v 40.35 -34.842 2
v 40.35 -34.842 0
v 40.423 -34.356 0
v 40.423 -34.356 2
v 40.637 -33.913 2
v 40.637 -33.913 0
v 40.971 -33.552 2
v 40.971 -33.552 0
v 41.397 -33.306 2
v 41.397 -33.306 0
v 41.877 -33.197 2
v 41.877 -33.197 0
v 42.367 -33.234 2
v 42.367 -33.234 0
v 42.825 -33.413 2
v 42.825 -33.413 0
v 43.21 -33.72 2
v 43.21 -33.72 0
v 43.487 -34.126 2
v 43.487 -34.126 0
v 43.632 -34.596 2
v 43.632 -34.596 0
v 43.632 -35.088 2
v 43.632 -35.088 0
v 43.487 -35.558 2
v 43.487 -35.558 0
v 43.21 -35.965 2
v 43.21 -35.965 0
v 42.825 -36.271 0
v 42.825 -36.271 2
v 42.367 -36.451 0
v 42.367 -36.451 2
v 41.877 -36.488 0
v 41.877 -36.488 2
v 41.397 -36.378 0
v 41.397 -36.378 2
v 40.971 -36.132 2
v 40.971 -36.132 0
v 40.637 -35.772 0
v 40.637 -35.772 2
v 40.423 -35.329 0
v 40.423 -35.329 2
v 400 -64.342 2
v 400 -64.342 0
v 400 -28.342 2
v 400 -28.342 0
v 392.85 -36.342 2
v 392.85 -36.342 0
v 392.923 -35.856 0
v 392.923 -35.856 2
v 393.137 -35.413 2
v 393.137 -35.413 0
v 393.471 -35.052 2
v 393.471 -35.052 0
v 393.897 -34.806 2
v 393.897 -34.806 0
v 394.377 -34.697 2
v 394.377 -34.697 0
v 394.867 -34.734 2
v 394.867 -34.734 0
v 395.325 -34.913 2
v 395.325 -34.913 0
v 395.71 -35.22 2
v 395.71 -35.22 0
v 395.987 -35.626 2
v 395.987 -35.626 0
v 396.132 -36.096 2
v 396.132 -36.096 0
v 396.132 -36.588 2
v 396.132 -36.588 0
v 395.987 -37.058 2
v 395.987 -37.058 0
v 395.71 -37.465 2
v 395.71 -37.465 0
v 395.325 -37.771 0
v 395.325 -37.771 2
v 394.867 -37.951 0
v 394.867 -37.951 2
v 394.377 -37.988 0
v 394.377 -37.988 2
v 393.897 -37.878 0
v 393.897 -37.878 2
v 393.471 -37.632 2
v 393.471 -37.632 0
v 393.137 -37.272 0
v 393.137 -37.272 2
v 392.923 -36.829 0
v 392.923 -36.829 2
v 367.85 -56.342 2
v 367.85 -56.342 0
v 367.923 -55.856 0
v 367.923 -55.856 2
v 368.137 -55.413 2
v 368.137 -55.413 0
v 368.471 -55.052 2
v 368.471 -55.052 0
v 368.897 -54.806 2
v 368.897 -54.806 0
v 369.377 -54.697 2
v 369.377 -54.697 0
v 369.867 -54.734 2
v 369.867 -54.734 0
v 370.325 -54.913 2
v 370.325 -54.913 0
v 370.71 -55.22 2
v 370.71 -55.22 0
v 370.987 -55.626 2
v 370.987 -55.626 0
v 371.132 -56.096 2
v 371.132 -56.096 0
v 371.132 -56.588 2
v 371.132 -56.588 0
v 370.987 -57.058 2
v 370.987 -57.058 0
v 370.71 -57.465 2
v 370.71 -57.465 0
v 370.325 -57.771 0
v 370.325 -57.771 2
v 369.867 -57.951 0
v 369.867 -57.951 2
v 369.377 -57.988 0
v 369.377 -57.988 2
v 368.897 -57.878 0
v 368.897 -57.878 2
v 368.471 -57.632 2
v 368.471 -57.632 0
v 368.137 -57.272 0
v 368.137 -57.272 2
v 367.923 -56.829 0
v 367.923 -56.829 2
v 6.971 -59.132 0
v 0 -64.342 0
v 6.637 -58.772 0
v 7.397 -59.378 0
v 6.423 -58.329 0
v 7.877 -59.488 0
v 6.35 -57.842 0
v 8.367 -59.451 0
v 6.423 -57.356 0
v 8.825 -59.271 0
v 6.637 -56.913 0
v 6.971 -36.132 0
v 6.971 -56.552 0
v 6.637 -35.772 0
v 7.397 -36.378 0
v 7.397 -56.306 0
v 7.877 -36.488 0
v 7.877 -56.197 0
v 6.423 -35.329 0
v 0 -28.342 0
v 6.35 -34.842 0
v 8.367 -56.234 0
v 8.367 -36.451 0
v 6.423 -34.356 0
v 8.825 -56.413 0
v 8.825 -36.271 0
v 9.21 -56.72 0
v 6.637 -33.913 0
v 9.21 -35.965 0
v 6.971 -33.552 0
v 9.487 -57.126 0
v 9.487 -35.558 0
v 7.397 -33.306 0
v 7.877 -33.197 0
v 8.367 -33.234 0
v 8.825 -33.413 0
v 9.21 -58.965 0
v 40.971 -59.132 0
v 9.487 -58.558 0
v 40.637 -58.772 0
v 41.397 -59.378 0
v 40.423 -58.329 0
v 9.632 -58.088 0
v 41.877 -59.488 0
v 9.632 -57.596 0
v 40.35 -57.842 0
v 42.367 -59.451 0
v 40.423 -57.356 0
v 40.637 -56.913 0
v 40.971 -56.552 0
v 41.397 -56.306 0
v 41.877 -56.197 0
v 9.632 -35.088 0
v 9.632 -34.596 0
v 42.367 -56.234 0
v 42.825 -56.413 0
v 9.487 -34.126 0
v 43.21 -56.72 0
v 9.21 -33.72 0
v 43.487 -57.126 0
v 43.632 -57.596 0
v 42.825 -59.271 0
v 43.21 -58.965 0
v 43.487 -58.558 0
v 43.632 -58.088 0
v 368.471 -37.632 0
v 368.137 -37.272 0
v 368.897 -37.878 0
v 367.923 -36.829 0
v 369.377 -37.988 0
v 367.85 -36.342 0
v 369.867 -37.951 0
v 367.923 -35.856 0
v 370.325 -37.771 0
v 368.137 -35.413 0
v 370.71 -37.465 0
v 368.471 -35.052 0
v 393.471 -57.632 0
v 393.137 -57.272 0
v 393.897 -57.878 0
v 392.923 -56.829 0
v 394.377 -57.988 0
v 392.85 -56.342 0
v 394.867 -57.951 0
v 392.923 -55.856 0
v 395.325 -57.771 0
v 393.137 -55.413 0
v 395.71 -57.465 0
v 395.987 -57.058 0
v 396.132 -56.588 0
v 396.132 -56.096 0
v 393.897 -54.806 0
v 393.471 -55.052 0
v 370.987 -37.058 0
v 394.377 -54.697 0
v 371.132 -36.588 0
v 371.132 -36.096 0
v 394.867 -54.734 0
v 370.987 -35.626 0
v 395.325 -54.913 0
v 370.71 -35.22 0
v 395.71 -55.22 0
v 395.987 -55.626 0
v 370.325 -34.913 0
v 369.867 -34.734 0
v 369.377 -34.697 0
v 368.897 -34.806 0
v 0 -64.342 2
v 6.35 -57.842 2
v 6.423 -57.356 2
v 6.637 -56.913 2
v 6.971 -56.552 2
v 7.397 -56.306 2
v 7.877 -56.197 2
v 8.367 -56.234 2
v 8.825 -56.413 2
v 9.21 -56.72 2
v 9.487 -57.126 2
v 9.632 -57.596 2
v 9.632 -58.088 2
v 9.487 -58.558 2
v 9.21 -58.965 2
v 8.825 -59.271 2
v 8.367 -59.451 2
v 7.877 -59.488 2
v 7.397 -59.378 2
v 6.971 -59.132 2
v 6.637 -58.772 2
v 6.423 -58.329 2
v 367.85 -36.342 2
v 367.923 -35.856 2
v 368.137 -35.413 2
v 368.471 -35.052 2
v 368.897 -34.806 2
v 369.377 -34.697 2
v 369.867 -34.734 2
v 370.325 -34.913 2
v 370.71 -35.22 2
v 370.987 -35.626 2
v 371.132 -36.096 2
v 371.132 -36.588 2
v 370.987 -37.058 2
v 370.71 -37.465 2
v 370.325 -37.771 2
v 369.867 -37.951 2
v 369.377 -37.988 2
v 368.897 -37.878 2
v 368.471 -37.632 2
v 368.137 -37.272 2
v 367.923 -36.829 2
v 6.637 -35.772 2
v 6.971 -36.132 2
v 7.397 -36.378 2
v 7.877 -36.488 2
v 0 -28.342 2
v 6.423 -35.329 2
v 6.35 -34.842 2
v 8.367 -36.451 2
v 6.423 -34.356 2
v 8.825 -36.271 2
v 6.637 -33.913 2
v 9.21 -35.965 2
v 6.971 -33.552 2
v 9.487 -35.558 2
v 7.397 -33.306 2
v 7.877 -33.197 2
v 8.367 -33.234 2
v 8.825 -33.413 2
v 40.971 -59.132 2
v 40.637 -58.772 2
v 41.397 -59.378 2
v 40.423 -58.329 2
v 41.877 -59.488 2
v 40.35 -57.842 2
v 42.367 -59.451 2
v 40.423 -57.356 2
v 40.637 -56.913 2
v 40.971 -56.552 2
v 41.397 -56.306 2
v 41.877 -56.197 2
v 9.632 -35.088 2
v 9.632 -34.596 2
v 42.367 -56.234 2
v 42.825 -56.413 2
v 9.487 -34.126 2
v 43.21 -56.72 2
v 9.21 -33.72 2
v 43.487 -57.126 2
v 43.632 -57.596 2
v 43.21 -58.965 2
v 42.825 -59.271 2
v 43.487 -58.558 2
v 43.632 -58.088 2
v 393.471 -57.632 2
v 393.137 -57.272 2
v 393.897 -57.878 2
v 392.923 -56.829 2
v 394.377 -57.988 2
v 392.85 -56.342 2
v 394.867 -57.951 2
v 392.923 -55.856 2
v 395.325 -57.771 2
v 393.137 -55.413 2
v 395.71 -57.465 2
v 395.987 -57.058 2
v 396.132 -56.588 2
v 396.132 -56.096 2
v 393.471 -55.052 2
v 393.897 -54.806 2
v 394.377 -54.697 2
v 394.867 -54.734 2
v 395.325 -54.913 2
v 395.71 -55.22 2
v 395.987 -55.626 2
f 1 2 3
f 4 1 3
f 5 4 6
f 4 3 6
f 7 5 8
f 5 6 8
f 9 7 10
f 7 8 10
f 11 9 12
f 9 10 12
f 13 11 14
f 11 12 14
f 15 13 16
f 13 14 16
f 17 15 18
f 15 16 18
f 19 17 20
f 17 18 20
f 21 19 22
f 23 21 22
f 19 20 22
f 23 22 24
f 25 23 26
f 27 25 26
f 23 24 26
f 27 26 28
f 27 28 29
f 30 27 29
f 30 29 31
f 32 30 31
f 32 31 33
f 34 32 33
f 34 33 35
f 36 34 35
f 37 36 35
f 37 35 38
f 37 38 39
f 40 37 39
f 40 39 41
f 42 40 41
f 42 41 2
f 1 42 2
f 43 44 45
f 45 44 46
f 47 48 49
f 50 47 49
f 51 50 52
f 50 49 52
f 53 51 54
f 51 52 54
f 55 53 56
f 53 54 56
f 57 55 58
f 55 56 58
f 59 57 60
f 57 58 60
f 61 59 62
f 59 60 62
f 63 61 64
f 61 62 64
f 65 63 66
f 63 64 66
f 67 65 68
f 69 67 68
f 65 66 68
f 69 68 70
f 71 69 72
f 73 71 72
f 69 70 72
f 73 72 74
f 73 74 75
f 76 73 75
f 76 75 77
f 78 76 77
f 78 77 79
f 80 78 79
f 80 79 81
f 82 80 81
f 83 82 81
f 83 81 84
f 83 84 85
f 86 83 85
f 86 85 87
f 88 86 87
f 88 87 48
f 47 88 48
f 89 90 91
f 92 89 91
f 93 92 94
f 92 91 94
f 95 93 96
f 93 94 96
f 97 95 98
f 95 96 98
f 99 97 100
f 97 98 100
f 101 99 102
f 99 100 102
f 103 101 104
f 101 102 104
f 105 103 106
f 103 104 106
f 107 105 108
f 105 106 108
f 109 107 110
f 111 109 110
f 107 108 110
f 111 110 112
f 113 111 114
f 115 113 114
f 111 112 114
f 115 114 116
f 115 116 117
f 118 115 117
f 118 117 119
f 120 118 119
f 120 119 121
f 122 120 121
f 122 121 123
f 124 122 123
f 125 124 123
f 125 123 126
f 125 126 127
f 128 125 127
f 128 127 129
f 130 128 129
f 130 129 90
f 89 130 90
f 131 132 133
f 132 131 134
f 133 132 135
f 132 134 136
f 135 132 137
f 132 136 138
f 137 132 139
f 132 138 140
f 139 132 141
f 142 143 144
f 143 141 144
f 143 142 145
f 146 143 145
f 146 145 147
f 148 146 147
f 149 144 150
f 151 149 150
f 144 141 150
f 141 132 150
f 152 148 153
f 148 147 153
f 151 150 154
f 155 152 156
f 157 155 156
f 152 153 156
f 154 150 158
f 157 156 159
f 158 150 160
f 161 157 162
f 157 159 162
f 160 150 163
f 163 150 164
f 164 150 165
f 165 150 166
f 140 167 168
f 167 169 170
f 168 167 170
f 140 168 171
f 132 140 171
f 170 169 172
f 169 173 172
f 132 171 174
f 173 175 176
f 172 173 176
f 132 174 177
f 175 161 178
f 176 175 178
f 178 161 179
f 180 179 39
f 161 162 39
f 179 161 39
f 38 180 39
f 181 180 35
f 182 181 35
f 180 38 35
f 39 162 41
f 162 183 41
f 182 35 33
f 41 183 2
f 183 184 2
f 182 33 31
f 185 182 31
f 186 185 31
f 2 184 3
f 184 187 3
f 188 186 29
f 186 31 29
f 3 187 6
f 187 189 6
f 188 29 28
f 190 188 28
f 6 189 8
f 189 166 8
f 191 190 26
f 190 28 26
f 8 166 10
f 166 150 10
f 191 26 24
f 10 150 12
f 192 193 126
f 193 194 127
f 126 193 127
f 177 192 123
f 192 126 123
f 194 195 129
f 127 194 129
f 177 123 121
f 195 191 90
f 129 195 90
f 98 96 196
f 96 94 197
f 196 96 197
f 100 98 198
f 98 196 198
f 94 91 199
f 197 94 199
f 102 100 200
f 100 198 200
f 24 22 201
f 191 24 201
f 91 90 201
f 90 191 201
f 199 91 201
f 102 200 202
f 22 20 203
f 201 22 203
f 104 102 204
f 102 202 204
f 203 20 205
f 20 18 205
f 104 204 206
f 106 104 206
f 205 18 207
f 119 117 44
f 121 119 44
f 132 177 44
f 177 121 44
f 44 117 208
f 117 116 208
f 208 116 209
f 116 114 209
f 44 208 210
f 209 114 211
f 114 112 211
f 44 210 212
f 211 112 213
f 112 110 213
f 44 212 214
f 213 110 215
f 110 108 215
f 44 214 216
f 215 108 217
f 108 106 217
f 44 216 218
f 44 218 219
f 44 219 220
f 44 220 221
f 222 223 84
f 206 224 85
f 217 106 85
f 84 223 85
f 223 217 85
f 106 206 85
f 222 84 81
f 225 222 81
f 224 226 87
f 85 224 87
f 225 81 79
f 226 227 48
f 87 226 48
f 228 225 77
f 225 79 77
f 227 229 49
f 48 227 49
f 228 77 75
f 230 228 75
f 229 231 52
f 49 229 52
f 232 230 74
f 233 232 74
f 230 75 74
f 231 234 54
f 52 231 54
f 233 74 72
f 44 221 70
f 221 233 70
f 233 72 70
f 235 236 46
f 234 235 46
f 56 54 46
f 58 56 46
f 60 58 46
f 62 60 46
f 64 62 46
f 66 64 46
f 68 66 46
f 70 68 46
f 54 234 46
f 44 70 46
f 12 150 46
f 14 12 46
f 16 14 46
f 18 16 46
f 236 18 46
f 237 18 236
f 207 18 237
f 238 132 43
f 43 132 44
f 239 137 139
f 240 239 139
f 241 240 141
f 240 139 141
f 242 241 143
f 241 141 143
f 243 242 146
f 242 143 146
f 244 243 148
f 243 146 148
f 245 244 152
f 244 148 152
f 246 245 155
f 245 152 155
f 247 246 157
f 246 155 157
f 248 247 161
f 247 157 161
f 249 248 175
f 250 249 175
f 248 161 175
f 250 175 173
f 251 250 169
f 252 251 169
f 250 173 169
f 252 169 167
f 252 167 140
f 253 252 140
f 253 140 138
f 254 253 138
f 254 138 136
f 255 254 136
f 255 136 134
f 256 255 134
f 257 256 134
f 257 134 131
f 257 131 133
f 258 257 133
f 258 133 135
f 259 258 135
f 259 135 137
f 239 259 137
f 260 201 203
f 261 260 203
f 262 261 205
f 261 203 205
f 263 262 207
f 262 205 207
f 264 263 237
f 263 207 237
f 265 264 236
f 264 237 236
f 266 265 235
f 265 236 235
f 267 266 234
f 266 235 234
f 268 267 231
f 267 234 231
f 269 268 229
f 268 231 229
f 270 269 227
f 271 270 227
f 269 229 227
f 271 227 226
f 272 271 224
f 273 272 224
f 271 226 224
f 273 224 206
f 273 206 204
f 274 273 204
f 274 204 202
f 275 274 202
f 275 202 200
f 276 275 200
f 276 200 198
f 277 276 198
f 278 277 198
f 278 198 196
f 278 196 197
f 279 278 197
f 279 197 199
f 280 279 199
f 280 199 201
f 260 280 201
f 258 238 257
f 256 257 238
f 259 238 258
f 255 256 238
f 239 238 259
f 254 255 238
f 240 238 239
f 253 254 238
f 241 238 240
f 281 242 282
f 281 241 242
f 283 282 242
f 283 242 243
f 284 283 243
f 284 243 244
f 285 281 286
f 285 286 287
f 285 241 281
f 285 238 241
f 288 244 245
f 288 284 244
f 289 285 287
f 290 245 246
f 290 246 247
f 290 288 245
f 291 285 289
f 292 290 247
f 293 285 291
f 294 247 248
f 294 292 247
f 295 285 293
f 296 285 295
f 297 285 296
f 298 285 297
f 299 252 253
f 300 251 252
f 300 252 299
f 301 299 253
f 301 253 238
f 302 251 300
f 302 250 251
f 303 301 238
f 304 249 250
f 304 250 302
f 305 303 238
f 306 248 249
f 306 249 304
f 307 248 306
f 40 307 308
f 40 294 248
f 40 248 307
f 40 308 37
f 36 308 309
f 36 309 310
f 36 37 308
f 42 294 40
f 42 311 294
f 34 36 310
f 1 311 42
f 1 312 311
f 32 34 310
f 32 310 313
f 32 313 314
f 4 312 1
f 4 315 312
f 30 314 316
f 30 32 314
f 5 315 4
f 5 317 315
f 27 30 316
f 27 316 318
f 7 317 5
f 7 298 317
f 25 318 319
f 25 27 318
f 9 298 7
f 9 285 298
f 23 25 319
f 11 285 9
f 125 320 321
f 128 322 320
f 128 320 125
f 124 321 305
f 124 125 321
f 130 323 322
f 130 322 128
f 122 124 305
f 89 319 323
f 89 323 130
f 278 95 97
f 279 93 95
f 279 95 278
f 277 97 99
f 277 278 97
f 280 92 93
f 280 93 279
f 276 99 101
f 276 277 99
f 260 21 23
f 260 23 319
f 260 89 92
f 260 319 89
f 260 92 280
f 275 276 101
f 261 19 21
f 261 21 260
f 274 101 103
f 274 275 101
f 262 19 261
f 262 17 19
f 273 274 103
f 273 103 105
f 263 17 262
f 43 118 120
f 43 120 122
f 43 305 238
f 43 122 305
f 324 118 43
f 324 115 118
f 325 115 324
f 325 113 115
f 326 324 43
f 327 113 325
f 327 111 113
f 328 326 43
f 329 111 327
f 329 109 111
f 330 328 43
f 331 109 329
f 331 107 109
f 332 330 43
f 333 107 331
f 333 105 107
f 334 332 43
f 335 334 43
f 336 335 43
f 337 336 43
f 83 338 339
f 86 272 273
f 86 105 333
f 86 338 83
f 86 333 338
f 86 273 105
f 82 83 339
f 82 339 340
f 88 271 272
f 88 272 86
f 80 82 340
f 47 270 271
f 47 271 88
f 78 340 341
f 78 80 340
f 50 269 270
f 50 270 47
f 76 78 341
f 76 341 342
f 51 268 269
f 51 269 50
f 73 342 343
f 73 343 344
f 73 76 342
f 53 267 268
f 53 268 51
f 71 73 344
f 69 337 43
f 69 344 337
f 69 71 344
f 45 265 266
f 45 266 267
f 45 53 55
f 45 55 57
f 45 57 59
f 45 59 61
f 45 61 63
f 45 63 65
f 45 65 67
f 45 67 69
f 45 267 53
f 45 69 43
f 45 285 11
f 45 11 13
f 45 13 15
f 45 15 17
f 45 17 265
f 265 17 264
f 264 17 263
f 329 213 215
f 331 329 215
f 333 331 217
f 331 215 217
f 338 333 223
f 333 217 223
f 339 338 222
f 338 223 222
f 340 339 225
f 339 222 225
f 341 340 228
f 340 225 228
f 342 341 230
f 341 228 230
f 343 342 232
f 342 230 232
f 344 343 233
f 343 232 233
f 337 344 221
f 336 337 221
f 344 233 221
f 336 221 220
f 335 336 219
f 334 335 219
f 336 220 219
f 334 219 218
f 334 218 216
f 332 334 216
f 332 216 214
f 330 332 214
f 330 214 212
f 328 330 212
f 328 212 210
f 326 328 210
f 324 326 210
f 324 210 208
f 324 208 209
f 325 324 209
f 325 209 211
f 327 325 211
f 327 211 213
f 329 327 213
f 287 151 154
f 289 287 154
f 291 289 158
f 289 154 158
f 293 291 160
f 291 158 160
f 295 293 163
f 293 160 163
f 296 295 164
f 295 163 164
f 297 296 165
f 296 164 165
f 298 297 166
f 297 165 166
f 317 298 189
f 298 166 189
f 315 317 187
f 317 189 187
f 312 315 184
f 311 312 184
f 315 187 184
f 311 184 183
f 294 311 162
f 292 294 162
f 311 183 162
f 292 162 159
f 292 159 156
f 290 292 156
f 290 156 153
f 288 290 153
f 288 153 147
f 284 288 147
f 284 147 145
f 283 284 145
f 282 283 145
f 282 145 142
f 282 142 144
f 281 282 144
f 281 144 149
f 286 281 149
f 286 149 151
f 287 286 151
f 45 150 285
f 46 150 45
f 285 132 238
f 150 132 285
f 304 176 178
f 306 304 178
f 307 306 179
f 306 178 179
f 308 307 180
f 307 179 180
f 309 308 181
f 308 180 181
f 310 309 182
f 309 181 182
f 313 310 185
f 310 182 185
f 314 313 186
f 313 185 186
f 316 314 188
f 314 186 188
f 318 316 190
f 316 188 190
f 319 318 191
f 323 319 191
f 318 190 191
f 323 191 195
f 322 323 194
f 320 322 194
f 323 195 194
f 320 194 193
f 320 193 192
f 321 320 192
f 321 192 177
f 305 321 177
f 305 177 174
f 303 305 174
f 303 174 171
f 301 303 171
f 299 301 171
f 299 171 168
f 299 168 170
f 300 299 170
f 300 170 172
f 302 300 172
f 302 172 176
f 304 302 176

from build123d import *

# Parameters (mm, degrees)
SKETCH_1_W             = 400
SKETCH_1_H             = 36
EXTRUDE_1_DEPTH        = 2
HOLE_WIZARD_M4_1_D     = 3.3
HOLE_WIZARD_M4_1_DEPTH = 10
HOLE_WIZARD_M4_1_TIP   = 0.991420021
HOLE_WIZARD_M4_2_D     = 3.3
HOLE_WIZARD_M4_2_DEPTH = 10
HOLE_WIZARD_M4_2_TIP   = 0.991420021


with BuildPart() as part:
    # 草图1 → 凸台-拉伸1 (new body)
    with BuildSketch(Plane.XY):
        with Locations((200, -46.342266003)):
            Rectangle(SKETCH_1_W, SKETCH_1_H)
    extrude(amount=EXTRUDE_1_DEPTH)

    # M4 螺纹孔的螺纹孔钻头1
    with Locations(Plane(origin=(8, -34.842266003, 2), x_dir=(1, 0, 0), z_dir=(0, 0, 1))):
        with Locations((0, 0), (34, 0), (0, -23), (34, -23)):
            Hole(HOLE_WIZARD_M4_1_D / 2, depth=HOLE_WIZARD_M4_1_DEPTH)
            with Locations((0, 0, -(HOLE_WIZARD_M4_1_DEPTH + HOLE_WIZARD_M4_1_TIP / 2))):  # 118° drill point
                Cone(0, HOLE_WIZARD_M4_1_D / 2, HOLE_WIZARD_M4_1_TIP, mode=Mode.SUBTRACT)

    # M4 螺纹孔的螺纹孔钻头2
    with Locations(Plane(origin=(394.5, -36.342266003, 2), x_dir=(1, 0, 0), z_dir=(0, 0, 1))):
        with Locations((0, 0), (0, -20), (-25, -20), (-25, 0)):
            Hole(HOLE_WIZARD_M4_2_D / 2, depth=HOLE_WIZARD_M4_2_DEPTH)
            with Locations((0, 0, -(HOLE_WIZARD_M4_2_DEPTH + HOLE_WIZARD_M4_2_TIP / 2))):  # 118° drill point
                Cone(0, HOLE_WIZARD_M4_2_D / 2, HOLE_WIZARD_M4_2_TIP, mode=Mode.SUBTRACT)


solid = part.part
